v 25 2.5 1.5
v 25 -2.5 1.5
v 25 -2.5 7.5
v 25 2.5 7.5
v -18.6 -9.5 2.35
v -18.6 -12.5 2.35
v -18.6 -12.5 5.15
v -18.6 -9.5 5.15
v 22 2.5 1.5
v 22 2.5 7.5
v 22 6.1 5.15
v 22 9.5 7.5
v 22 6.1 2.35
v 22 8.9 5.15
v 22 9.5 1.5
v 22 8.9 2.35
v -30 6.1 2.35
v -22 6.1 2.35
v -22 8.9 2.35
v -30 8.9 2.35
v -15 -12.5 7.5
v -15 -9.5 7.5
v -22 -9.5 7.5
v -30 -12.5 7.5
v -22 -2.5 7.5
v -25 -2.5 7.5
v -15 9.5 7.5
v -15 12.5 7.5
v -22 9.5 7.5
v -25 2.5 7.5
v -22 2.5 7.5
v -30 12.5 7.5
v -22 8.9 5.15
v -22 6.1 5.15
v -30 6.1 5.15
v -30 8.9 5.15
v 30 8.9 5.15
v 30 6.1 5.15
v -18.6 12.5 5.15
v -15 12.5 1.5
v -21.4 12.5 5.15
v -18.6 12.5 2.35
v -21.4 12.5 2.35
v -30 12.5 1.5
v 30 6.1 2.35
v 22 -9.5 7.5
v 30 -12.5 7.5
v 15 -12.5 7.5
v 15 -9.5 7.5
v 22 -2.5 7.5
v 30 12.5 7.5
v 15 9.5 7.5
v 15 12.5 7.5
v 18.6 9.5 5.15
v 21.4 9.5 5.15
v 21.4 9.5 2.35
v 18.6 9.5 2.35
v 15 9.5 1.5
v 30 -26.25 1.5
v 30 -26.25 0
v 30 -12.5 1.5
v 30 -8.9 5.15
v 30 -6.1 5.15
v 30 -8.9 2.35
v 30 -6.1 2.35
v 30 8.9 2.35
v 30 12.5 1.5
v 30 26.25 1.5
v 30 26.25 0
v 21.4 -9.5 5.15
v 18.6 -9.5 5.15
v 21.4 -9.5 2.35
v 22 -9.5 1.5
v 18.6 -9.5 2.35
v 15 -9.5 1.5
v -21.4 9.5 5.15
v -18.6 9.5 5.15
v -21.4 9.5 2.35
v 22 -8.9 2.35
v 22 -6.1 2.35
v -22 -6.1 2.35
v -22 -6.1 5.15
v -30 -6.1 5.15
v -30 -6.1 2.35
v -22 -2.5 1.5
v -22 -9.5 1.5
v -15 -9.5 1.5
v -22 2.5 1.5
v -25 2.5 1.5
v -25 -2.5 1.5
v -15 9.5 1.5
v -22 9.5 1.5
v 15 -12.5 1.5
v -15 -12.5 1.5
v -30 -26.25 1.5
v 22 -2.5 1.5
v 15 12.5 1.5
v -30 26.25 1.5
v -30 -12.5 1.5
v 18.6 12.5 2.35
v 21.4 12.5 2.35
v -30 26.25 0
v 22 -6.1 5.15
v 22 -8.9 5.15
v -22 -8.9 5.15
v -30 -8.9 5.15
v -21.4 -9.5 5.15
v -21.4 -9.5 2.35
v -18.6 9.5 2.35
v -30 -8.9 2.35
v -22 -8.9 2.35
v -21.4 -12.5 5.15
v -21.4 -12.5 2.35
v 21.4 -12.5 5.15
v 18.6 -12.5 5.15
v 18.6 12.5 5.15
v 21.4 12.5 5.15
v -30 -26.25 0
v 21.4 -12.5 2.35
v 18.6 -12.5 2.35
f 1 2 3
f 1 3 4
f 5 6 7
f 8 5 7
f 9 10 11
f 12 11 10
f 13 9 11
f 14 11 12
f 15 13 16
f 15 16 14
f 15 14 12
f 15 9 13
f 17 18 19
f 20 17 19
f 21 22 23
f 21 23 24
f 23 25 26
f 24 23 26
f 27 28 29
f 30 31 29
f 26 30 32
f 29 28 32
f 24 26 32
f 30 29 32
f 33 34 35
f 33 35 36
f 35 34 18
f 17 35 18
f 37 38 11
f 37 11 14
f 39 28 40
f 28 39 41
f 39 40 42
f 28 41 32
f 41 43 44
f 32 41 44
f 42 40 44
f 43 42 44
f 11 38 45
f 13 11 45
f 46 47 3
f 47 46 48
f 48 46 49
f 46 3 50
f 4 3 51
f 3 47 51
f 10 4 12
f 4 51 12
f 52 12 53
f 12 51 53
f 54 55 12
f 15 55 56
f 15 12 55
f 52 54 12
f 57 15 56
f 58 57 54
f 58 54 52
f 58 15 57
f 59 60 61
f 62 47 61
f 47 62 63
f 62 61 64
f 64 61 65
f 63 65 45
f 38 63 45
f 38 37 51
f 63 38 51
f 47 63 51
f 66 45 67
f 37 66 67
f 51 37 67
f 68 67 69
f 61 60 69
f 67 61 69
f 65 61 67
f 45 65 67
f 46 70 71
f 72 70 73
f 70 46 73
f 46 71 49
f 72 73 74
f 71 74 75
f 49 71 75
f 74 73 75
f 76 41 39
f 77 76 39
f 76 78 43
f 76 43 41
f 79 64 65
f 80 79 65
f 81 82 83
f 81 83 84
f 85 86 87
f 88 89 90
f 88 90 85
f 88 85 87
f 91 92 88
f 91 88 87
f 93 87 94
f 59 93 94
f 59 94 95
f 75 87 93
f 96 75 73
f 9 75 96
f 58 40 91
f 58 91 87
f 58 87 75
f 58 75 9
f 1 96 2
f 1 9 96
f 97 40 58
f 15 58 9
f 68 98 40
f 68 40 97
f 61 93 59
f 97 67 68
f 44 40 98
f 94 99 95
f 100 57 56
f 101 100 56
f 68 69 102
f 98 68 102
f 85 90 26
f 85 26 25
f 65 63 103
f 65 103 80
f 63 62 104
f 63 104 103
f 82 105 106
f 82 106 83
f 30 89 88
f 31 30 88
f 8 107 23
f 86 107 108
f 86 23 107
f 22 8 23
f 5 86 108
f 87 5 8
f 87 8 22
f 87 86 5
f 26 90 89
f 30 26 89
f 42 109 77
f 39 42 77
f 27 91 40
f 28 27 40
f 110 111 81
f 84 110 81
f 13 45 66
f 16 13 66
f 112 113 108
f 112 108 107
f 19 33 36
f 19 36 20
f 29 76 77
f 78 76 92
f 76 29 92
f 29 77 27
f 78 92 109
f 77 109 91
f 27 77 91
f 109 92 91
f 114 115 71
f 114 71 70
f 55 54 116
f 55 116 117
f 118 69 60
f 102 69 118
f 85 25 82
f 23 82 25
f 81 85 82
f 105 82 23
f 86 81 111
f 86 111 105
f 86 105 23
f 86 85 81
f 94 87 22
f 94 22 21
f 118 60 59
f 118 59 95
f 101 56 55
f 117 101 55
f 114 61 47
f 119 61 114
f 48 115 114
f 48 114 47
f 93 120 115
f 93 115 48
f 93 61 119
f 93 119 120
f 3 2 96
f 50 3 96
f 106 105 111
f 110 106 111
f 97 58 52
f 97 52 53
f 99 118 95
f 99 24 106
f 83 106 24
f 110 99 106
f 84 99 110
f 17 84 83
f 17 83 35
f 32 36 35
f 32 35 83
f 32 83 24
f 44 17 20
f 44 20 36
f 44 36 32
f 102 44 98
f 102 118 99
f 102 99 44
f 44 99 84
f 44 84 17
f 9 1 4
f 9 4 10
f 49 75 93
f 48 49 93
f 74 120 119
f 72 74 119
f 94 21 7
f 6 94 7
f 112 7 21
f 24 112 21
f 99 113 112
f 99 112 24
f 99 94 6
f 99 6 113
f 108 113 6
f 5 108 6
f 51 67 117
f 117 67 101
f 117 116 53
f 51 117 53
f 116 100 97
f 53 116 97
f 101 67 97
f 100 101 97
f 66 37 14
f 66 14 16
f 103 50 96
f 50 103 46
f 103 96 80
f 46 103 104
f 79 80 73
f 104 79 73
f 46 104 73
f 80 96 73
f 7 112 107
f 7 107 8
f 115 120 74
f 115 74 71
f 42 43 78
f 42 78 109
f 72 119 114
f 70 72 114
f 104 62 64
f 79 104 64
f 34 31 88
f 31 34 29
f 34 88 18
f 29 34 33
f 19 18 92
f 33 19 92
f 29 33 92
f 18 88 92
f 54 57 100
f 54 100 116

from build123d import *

# Parameters (mm, degrees)
ESBO_O1_R                = 8.3
RESSALTO_EXTRUS_O1_DEPTH = 1.5
RESSALTO_EXTRUS_O2_DEPTH = 6
ESBO_O3_W                = 2.8
ESBO_O3_H                = 2.8
CORTE_EXTRUS_O1_DEPTH    = 37.142080737
ESBO_O4_W                = 2.8
ESBO_O4_H                = 2.8
CORTE_EXTRUS_O2_DEPTH    = 53.08166664
ESBO_O6_W                = 5
ESBO_O6_H                = 25
RESSALTO_EXTRUS_O5_DEPTH = 7.5
ESBO_O7_W                = 2.8
ESBO_O7_H                = 2.8
CORTE_EXTRUS_O3_DEPTH    = 60
ESBO_O8_W                = 60
ESBO_O8_H                = 52.5
ESBO_O8_R                = 8.3
RESSALTO_EXTRUS_O6_DEPTH = 1.5
ESBO_O9_R                = 8.3
RESSALTO_EXTRUS_O7_DEPTH = 1.5


with BuildPart() as part:
    # Esboço1 → Ressalto-extrusão1 (new body)
    with BuildSketch(Plane.XY):
        Polygon((-25, -12.5), (-25, 12.5), (25, 12.5), (25, -12.5), (15, -12.5), (-15, -12.5), align=None)
        with Locations((-13, 0)):
            Circle(ESBO_O1_R, mode=Mode.SUBTRACT)
        with Locations(Location((13, 0, 0), (0, 0, 180))):
            Circle(ESBO_O1_R, mode=Mode.SUBTRACT)
    extrude(amount=RESSALTO_EXTRUS_O1_DEPTH)

    # Esboço2 → Ressalto-extrusão2 (add)
    with BuildSketch(Plane.XY.offset(1.5)):
        Polygon((-20, -12.5), (-25, -12.5), (-25, -2.5), (-22, -2.5), (-22, -9.5), (-15, -9.5), (-15, -12.5), align=None)
        Polygon((22, -2.5), (22, -9.5), (15, -9.5), (15, -12.5), (20, -12.5), (25, -12.5), (25, -2.5), align=None)
        Polygon((20, 12.5), (25, 12.5), (25, 2.5), (22, 2.5), (22, 9.5), (15, 9.5), (15, 12.5), align=None)
        Polygon((-22, 2.5), (-22, 9.5), (-15, 9.5), (-15, 12.5), (-20, 12.5), (-25, 12.5), (-25, 2.5), align=None)
    extrude(amount=RESSALTO_EXTRUS_O2_DEPTH)

    # Esboço3 → Corte-extrusão1 (cut, through all)
    with BuildSketch(Plane.XZ.offset(12.5)):
        with Locations((-20, 3.75)):
            Rectangle(ESBO_O3_W, ESBO_O3_H)
        with Locations((20, 3.75)):
            Rectangle(ESBO_O3_W, ESBO_O3_H)
    extrude(amount=-CORTE_EXTRUS_O1_DEPTH, mode=Mode.SUBTRACT)

    # Esboço4 → Corte-extrusão2 (cut, through all)
    with BuildSketch(Plane.ZY.offset(25)):
        with Locations((3.75, 7.5)):
            Rectangle(ESBO_O4_W, ESBO_O4_H)
        with Locations((3.75, -7.5)):
            Rectangle(ESBO_O4_W, ESBO_O4_H)
    extrude(amount=-CORTE_EXTRUS_O2_DEPTH, mode=Mode.SUBTRACT)

    # Esboço6 → Ressalto-extrusão5 (add)
    with BuildSketch(Plane(origin=(0, 0, 0), x_dir=(-1, 0, 0), z_dir=(0, 0, -1))):
        with Locations((-27.5, 0)):
            Rectangle(ESBO_O6_W, ESBO_O6_H)
        with Locations((27.5, 0)):
            Rectangle(ESBO_O6_W, ESBO_O6_H)
    extrude(amount=-RESSALTO_EXTRUS_O5_DEPTH)

    # Esboço7 → Corte-extrusão3 (cut)
    with BuildSketch(Plane(origin=(30, 0, 0), x_dir=(0, 0, -1), z_dir=(1, 0, 0))):
        with Locations((-3.75, -7.5)):
            Rectangle(ESBO_O7_W, ESBO_O7_H)
        with Locations((-3.75, 7.5)):
            Rectangle(ESBO_O7_W, ESBO_O7_H)
    extrude(amount=-CORTE_EXTRUS_O3_DEPTH, mode=Mode.SUBTRACT)

    # Esboço8 → Ressalto-extrusão6 (add)
    with BuildSketch(Plane(origin=(0, 0, 0), x_dir=(-1, 0, 0), z_dir=(0, 0, -1))):
        Rectangle(ESBO_O8_W, ESBO_O8_H)
        with Locations(Location((13, 0, 0), (0, 0, 180))):
            Circle(ESBO_O8_R, mode=Mode.SUBTRACT)
        with Locations((-13, 0)):
            Circle(ESBO_O8_R, mode=Mode.SUBTRACT)
    extrude(amount=-RESSALTO_EXTRUS_O6_DEPTH)

    # Esboço9 → Ressalto-extrusão7 (add, through all)
    with BuildSketch(Plane.XY.offset(1.5)):
        with Locations((-13, 0)):
            Circle(ESBO_O9_R)
        with Locations((13, 0)):
            Circle(ESBO_O9_R)
    extrude(amount=-RESSALTO_EXTRUS_O7_DEPTH)


solid = part.part
